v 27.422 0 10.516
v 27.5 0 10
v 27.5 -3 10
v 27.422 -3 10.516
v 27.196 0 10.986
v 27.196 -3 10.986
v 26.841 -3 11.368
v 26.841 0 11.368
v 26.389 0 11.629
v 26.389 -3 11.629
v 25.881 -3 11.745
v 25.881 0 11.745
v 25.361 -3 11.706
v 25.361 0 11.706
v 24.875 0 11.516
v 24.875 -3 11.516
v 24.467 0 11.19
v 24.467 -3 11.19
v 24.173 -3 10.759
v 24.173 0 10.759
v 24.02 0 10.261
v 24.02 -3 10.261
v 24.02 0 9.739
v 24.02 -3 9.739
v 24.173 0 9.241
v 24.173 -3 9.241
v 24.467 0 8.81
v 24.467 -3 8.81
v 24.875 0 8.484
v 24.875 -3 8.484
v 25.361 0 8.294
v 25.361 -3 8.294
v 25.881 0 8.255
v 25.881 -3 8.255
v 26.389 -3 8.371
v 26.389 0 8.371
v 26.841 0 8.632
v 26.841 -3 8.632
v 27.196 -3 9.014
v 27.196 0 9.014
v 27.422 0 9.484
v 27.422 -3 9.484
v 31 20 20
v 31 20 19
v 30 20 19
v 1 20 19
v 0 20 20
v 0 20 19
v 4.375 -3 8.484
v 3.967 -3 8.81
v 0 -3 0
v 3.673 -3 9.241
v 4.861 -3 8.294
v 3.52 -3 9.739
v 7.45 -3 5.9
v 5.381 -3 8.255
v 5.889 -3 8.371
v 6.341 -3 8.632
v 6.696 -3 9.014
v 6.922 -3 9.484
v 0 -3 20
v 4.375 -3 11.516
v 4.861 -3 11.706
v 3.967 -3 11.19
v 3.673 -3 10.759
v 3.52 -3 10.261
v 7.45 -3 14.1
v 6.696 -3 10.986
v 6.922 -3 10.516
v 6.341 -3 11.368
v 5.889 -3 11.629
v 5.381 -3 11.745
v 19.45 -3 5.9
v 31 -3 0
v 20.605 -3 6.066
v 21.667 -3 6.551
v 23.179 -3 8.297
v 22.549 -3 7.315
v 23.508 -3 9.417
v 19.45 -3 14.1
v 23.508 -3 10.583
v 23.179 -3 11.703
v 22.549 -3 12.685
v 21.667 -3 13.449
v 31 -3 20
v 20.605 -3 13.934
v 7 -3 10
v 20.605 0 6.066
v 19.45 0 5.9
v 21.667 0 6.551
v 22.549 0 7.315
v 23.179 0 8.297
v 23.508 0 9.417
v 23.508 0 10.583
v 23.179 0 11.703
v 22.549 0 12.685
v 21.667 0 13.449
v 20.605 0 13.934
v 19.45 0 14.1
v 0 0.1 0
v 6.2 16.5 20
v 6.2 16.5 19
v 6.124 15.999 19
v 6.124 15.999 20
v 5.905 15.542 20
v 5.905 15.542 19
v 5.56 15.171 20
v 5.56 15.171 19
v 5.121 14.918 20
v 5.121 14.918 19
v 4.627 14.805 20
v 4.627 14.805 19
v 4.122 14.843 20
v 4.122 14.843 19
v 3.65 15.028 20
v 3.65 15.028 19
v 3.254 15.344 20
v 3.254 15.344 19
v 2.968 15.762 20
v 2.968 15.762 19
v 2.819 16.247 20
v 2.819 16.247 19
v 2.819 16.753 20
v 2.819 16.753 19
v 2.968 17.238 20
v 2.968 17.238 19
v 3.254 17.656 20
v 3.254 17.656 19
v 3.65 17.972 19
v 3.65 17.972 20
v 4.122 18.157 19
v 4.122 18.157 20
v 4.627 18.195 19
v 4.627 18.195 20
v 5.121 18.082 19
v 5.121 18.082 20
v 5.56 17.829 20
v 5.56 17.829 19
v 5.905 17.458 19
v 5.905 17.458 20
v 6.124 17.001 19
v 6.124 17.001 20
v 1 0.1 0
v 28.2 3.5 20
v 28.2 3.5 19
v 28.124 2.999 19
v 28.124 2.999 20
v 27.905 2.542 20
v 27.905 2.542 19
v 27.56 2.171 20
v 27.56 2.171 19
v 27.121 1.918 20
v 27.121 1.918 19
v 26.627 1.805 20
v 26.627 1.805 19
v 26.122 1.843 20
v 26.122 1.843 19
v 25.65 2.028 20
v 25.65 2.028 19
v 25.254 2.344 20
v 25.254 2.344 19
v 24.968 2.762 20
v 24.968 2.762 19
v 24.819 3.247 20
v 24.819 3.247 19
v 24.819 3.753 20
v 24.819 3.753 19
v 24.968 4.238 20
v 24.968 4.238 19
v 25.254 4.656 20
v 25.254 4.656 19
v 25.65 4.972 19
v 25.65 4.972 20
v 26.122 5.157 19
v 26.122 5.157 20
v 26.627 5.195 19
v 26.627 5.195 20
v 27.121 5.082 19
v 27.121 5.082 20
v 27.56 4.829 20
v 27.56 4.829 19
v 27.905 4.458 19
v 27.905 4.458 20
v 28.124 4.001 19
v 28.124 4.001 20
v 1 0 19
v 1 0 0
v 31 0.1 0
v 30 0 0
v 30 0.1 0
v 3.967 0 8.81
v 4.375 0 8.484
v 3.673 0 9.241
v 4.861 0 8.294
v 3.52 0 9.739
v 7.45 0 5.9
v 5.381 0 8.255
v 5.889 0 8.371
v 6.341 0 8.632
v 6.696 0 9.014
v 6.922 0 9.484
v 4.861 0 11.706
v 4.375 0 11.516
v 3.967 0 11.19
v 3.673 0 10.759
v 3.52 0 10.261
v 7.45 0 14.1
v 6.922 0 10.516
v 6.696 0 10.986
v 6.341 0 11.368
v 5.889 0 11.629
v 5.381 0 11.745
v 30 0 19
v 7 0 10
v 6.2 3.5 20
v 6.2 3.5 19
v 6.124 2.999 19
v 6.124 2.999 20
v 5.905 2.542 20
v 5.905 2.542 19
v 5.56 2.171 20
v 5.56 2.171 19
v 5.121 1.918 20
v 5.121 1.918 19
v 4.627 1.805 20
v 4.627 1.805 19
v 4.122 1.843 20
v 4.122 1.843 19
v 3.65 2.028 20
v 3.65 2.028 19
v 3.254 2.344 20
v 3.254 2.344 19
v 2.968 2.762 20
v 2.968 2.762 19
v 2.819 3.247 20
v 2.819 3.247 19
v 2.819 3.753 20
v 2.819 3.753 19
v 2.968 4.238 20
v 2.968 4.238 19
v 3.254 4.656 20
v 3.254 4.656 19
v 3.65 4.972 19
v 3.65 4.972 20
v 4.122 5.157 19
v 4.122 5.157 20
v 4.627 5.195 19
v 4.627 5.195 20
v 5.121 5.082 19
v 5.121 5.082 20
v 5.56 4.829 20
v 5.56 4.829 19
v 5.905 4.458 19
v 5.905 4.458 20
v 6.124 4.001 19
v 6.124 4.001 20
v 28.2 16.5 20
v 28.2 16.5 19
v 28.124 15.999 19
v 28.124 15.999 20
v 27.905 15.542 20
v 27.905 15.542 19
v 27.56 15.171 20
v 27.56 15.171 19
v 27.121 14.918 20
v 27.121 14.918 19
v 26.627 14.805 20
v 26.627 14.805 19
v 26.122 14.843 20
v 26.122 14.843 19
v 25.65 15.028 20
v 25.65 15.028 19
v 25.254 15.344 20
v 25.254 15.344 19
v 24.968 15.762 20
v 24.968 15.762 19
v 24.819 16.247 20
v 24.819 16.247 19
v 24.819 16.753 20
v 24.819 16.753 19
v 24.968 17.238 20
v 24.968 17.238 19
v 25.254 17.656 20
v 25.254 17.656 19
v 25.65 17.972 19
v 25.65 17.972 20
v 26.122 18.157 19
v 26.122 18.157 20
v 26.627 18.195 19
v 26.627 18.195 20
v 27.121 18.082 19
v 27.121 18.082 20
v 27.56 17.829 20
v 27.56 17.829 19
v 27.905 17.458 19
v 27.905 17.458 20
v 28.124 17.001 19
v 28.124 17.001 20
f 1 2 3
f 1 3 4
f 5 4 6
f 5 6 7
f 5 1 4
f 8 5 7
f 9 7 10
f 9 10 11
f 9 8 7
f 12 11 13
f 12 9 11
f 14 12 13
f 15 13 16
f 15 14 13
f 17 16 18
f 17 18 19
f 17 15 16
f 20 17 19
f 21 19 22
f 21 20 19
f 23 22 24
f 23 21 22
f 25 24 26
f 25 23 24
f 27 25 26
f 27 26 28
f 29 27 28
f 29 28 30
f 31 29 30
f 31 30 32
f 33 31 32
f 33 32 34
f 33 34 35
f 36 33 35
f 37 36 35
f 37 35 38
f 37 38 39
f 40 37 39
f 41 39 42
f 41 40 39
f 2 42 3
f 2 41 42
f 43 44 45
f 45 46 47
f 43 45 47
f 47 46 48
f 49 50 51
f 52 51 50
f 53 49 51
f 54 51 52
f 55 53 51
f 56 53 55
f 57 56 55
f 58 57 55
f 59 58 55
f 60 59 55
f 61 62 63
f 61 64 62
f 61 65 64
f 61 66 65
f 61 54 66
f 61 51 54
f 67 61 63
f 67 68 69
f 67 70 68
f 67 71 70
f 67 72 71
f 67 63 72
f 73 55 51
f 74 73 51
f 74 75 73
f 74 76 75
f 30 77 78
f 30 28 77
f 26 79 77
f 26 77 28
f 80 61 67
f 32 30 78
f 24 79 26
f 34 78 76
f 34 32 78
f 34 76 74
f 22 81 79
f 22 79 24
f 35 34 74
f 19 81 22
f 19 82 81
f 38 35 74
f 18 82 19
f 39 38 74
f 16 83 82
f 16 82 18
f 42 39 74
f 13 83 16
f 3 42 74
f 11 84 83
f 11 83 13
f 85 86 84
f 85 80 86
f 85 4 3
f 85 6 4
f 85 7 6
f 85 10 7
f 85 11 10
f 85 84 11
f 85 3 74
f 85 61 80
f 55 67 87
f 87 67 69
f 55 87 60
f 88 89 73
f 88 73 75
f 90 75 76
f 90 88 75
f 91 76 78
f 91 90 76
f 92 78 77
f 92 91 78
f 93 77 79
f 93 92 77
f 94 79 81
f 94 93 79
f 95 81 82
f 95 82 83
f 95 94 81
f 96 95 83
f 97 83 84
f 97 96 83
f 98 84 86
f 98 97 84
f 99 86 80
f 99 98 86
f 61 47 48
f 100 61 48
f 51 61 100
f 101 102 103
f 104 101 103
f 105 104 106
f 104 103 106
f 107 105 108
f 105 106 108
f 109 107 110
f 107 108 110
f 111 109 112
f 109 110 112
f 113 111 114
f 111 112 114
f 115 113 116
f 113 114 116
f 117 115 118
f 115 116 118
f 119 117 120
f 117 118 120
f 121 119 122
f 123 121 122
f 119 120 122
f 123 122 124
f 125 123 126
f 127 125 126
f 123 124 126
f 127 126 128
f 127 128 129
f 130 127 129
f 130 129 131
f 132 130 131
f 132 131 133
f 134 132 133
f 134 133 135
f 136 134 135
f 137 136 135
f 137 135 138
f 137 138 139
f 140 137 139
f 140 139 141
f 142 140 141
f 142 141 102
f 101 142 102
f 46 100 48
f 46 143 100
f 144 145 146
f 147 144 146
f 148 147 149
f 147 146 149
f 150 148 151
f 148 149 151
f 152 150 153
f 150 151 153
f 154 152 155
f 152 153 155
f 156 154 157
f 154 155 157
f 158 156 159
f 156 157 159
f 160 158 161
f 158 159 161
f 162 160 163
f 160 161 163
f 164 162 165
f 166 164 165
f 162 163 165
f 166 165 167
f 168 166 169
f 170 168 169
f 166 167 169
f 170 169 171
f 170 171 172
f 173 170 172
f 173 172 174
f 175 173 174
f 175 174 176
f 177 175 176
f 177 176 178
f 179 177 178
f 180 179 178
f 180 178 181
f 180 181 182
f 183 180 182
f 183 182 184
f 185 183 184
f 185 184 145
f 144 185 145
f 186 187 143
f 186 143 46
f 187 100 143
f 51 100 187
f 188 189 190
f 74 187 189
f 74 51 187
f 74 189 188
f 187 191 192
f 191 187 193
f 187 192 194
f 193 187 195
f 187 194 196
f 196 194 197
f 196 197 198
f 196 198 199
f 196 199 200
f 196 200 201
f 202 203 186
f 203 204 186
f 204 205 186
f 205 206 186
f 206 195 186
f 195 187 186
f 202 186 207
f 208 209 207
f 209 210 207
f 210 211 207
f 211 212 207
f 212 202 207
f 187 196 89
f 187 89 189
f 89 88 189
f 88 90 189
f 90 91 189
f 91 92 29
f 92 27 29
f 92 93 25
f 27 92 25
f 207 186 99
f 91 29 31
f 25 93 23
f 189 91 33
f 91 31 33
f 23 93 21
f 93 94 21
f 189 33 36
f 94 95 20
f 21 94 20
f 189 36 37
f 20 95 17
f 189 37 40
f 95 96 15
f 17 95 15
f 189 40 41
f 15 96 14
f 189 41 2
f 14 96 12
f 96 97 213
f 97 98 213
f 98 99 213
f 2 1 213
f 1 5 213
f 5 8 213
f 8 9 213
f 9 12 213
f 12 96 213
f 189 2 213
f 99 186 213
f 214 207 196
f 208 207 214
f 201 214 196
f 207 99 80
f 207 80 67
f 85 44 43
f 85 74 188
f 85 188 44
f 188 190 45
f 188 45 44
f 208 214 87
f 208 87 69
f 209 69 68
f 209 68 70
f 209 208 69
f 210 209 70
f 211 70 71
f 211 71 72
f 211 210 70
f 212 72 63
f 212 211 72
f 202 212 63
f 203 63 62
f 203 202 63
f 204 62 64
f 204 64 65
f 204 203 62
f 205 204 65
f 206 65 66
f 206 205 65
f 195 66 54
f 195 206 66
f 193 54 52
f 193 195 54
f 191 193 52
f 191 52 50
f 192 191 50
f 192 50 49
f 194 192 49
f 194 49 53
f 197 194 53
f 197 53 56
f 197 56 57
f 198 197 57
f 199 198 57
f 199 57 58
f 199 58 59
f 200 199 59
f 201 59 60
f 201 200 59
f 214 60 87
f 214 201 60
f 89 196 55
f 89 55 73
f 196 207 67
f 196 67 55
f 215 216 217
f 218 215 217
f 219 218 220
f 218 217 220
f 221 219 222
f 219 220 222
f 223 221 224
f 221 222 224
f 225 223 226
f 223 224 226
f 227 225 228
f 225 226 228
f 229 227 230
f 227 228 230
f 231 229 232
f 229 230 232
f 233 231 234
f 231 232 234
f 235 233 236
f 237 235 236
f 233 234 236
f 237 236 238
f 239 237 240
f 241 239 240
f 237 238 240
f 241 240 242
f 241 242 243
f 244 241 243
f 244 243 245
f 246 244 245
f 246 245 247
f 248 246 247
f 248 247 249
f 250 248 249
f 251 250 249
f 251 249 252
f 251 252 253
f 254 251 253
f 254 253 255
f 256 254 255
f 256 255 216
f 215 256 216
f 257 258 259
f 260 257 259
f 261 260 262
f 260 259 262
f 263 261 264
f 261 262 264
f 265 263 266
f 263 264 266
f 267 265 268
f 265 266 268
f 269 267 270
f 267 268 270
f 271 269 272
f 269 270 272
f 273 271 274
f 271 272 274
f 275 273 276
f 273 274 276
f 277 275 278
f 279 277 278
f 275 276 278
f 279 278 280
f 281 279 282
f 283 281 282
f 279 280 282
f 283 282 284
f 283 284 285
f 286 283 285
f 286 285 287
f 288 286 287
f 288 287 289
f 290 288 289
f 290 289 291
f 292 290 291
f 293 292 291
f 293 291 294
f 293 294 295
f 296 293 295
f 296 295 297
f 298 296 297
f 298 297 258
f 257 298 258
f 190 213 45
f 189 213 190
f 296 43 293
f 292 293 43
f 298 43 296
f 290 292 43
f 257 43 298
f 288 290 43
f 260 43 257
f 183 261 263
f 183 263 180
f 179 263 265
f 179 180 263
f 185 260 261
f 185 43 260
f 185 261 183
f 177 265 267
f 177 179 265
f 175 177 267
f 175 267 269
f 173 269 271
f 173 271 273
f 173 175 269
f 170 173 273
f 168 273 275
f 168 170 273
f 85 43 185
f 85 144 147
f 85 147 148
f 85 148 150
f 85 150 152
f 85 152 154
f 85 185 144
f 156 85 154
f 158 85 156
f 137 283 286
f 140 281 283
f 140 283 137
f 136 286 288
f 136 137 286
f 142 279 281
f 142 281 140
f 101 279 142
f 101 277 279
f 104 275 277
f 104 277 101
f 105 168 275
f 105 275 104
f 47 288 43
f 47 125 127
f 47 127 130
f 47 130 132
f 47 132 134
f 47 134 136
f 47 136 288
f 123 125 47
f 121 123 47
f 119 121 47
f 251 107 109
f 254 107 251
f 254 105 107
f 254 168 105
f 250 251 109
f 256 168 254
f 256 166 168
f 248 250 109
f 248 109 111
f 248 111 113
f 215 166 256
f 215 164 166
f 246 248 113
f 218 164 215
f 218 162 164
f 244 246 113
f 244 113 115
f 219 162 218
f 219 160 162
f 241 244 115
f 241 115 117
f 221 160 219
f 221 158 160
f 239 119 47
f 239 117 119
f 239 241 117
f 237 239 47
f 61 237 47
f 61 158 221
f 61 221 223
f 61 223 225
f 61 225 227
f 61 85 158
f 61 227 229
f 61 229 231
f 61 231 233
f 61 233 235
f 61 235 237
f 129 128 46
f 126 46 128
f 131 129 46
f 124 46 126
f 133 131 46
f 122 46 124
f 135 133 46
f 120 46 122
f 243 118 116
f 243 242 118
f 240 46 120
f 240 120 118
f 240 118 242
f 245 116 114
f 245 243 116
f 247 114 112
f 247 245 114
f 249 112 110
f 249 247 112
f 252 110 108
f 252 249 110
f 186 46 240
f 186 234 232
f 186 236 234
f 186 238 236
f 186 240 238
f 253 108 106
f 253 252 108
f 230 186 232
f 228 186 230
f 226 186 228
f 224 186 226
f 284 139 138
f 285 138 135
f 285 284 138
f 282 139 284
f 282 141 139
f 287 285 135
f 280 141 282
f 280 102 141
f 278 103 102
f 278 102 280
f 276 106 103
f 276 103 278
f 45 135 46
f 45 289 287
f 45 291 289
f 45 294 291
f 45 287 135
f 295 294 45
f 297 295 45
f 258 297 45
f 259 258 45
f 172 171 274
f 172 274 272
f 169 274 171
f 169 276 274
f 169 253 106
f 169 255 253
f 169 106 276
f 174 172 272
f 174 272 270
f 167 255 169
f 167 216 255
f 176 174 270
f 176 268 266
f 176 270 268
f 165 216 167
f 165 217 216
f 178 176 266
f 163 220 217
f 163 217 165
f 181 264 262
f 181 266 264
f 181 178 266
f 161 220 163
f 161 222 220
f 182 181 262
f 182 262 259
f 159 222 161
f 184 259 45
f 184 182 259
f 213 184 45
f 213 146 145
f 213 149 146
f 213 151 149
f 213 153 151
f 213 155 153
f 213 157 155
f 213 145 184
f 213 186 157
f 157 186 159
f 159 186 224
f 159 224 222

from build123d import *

# Parameters (mm, degrees)
SKETCH_W        = 31
SKETCH_H        = 20
SKETCH_R        = 1.75
PAD_DEPTH       = 3
PAD001_DEPTH    = 20
SKETCH002_R     = 1.7
HOLE_DEPTH      = 25
CHAMFER_1_SIZE2 = 19
CHAMFER_1_SIZE  = 19.9
CHAMFER_2_SIZE2 = 19
CHAMFER_2_SIZE  = 19.9


with BuildPart() as part:
    # Sketch → Pad (new body)
    with BuildSketch(Plane.XZ):
        with Locations((15.5, 10)):
            Rectangle(SKETCH_W, SKETCH_H)
        with Locations((25.75, 10)):
            Circle(SKETCH_R, mode=Mode.SUBTRACT)
        with Locations((5.25, 10)):
            Circle(SKETCH_R, mode=Mode.SUBTRACT)
        with BuildLine():
            ThreePointArc((19.45, 5.9), (23.55, 10), (19.45, 14.1))
            Line((19.45, 14.1), (7.45, 14.1))
            Line((7.45, 14.1), (7.45, 5.9))
            Line((7.45, 5.9), (19.45, 5.9))
        make_face(mode=Mode.SUBTRACT)
    extrude(amount=PAD_DEPTH)

    # Sketch001 (on Face11 of Pad) → Pad001 (join)
    with BuildSketch(Plane(origin=(0, 0, 0), x_dir=(1, 0, 0), z_dir=(0, 1, 0))):
        Polygon((31, 0), (31, -20), (0, -20), (0, 0), (1, 0), (1, -19), (30, -19), (30, 0), align=None)
    extrude(amount=PAD001_DEPTH)

    # Sketch002 (on Face13 of Pad001) → Hole (cut)
    with BuildSketch(Plane(origin=(0, 0, 19), x_dir=(1, 0, 0), z_dir=(0, 0, -1))):
        with Locations((4.5, -3.5)):
            Circle(SKETCH002_R)
        with Locations((26.5, -3.5)):
            Circle(SKETCH002_R)
        with Locations((26.5, -16.5)):
            Circle(SKETCH002_R)
        with Locations((4.5, -16.5)):
            Circle(SKETCH002_R)
    extrude(amount=-HOLE_DEPTH, mode=Mode.SUBTRACT)

    # Chamfer 1
    chamfer_1_edges = [part.edges().sort_by_distance(p)[0] for p in [
        (30.5, 20, 0),
    ]]
    chamfer_1_side = part.faces().sort_by_distance((30.5, 10, 0))[0]
    chamfer(chamfer_1_edges, length=CHAMFER_1_SIZE, length2=CHAMFER_1_SIZE2, reference=chamfer_1_side)

    # Chamfer 2
    chamfer_2_edges = [part.edges().sort_by_distance(p)[0] for p in [
        (0.5, 20, 0),
    ]]
    chamfer_2_side = part.faces().sort_by_distance((0.5, 10, 0))[0]
    chamfer(chamfer_2_edges, length=CHAMFER_2_SIZE, length2=CHAMFER_2_SIZE2, reference=chamfer_2_side)


solid = part.part
